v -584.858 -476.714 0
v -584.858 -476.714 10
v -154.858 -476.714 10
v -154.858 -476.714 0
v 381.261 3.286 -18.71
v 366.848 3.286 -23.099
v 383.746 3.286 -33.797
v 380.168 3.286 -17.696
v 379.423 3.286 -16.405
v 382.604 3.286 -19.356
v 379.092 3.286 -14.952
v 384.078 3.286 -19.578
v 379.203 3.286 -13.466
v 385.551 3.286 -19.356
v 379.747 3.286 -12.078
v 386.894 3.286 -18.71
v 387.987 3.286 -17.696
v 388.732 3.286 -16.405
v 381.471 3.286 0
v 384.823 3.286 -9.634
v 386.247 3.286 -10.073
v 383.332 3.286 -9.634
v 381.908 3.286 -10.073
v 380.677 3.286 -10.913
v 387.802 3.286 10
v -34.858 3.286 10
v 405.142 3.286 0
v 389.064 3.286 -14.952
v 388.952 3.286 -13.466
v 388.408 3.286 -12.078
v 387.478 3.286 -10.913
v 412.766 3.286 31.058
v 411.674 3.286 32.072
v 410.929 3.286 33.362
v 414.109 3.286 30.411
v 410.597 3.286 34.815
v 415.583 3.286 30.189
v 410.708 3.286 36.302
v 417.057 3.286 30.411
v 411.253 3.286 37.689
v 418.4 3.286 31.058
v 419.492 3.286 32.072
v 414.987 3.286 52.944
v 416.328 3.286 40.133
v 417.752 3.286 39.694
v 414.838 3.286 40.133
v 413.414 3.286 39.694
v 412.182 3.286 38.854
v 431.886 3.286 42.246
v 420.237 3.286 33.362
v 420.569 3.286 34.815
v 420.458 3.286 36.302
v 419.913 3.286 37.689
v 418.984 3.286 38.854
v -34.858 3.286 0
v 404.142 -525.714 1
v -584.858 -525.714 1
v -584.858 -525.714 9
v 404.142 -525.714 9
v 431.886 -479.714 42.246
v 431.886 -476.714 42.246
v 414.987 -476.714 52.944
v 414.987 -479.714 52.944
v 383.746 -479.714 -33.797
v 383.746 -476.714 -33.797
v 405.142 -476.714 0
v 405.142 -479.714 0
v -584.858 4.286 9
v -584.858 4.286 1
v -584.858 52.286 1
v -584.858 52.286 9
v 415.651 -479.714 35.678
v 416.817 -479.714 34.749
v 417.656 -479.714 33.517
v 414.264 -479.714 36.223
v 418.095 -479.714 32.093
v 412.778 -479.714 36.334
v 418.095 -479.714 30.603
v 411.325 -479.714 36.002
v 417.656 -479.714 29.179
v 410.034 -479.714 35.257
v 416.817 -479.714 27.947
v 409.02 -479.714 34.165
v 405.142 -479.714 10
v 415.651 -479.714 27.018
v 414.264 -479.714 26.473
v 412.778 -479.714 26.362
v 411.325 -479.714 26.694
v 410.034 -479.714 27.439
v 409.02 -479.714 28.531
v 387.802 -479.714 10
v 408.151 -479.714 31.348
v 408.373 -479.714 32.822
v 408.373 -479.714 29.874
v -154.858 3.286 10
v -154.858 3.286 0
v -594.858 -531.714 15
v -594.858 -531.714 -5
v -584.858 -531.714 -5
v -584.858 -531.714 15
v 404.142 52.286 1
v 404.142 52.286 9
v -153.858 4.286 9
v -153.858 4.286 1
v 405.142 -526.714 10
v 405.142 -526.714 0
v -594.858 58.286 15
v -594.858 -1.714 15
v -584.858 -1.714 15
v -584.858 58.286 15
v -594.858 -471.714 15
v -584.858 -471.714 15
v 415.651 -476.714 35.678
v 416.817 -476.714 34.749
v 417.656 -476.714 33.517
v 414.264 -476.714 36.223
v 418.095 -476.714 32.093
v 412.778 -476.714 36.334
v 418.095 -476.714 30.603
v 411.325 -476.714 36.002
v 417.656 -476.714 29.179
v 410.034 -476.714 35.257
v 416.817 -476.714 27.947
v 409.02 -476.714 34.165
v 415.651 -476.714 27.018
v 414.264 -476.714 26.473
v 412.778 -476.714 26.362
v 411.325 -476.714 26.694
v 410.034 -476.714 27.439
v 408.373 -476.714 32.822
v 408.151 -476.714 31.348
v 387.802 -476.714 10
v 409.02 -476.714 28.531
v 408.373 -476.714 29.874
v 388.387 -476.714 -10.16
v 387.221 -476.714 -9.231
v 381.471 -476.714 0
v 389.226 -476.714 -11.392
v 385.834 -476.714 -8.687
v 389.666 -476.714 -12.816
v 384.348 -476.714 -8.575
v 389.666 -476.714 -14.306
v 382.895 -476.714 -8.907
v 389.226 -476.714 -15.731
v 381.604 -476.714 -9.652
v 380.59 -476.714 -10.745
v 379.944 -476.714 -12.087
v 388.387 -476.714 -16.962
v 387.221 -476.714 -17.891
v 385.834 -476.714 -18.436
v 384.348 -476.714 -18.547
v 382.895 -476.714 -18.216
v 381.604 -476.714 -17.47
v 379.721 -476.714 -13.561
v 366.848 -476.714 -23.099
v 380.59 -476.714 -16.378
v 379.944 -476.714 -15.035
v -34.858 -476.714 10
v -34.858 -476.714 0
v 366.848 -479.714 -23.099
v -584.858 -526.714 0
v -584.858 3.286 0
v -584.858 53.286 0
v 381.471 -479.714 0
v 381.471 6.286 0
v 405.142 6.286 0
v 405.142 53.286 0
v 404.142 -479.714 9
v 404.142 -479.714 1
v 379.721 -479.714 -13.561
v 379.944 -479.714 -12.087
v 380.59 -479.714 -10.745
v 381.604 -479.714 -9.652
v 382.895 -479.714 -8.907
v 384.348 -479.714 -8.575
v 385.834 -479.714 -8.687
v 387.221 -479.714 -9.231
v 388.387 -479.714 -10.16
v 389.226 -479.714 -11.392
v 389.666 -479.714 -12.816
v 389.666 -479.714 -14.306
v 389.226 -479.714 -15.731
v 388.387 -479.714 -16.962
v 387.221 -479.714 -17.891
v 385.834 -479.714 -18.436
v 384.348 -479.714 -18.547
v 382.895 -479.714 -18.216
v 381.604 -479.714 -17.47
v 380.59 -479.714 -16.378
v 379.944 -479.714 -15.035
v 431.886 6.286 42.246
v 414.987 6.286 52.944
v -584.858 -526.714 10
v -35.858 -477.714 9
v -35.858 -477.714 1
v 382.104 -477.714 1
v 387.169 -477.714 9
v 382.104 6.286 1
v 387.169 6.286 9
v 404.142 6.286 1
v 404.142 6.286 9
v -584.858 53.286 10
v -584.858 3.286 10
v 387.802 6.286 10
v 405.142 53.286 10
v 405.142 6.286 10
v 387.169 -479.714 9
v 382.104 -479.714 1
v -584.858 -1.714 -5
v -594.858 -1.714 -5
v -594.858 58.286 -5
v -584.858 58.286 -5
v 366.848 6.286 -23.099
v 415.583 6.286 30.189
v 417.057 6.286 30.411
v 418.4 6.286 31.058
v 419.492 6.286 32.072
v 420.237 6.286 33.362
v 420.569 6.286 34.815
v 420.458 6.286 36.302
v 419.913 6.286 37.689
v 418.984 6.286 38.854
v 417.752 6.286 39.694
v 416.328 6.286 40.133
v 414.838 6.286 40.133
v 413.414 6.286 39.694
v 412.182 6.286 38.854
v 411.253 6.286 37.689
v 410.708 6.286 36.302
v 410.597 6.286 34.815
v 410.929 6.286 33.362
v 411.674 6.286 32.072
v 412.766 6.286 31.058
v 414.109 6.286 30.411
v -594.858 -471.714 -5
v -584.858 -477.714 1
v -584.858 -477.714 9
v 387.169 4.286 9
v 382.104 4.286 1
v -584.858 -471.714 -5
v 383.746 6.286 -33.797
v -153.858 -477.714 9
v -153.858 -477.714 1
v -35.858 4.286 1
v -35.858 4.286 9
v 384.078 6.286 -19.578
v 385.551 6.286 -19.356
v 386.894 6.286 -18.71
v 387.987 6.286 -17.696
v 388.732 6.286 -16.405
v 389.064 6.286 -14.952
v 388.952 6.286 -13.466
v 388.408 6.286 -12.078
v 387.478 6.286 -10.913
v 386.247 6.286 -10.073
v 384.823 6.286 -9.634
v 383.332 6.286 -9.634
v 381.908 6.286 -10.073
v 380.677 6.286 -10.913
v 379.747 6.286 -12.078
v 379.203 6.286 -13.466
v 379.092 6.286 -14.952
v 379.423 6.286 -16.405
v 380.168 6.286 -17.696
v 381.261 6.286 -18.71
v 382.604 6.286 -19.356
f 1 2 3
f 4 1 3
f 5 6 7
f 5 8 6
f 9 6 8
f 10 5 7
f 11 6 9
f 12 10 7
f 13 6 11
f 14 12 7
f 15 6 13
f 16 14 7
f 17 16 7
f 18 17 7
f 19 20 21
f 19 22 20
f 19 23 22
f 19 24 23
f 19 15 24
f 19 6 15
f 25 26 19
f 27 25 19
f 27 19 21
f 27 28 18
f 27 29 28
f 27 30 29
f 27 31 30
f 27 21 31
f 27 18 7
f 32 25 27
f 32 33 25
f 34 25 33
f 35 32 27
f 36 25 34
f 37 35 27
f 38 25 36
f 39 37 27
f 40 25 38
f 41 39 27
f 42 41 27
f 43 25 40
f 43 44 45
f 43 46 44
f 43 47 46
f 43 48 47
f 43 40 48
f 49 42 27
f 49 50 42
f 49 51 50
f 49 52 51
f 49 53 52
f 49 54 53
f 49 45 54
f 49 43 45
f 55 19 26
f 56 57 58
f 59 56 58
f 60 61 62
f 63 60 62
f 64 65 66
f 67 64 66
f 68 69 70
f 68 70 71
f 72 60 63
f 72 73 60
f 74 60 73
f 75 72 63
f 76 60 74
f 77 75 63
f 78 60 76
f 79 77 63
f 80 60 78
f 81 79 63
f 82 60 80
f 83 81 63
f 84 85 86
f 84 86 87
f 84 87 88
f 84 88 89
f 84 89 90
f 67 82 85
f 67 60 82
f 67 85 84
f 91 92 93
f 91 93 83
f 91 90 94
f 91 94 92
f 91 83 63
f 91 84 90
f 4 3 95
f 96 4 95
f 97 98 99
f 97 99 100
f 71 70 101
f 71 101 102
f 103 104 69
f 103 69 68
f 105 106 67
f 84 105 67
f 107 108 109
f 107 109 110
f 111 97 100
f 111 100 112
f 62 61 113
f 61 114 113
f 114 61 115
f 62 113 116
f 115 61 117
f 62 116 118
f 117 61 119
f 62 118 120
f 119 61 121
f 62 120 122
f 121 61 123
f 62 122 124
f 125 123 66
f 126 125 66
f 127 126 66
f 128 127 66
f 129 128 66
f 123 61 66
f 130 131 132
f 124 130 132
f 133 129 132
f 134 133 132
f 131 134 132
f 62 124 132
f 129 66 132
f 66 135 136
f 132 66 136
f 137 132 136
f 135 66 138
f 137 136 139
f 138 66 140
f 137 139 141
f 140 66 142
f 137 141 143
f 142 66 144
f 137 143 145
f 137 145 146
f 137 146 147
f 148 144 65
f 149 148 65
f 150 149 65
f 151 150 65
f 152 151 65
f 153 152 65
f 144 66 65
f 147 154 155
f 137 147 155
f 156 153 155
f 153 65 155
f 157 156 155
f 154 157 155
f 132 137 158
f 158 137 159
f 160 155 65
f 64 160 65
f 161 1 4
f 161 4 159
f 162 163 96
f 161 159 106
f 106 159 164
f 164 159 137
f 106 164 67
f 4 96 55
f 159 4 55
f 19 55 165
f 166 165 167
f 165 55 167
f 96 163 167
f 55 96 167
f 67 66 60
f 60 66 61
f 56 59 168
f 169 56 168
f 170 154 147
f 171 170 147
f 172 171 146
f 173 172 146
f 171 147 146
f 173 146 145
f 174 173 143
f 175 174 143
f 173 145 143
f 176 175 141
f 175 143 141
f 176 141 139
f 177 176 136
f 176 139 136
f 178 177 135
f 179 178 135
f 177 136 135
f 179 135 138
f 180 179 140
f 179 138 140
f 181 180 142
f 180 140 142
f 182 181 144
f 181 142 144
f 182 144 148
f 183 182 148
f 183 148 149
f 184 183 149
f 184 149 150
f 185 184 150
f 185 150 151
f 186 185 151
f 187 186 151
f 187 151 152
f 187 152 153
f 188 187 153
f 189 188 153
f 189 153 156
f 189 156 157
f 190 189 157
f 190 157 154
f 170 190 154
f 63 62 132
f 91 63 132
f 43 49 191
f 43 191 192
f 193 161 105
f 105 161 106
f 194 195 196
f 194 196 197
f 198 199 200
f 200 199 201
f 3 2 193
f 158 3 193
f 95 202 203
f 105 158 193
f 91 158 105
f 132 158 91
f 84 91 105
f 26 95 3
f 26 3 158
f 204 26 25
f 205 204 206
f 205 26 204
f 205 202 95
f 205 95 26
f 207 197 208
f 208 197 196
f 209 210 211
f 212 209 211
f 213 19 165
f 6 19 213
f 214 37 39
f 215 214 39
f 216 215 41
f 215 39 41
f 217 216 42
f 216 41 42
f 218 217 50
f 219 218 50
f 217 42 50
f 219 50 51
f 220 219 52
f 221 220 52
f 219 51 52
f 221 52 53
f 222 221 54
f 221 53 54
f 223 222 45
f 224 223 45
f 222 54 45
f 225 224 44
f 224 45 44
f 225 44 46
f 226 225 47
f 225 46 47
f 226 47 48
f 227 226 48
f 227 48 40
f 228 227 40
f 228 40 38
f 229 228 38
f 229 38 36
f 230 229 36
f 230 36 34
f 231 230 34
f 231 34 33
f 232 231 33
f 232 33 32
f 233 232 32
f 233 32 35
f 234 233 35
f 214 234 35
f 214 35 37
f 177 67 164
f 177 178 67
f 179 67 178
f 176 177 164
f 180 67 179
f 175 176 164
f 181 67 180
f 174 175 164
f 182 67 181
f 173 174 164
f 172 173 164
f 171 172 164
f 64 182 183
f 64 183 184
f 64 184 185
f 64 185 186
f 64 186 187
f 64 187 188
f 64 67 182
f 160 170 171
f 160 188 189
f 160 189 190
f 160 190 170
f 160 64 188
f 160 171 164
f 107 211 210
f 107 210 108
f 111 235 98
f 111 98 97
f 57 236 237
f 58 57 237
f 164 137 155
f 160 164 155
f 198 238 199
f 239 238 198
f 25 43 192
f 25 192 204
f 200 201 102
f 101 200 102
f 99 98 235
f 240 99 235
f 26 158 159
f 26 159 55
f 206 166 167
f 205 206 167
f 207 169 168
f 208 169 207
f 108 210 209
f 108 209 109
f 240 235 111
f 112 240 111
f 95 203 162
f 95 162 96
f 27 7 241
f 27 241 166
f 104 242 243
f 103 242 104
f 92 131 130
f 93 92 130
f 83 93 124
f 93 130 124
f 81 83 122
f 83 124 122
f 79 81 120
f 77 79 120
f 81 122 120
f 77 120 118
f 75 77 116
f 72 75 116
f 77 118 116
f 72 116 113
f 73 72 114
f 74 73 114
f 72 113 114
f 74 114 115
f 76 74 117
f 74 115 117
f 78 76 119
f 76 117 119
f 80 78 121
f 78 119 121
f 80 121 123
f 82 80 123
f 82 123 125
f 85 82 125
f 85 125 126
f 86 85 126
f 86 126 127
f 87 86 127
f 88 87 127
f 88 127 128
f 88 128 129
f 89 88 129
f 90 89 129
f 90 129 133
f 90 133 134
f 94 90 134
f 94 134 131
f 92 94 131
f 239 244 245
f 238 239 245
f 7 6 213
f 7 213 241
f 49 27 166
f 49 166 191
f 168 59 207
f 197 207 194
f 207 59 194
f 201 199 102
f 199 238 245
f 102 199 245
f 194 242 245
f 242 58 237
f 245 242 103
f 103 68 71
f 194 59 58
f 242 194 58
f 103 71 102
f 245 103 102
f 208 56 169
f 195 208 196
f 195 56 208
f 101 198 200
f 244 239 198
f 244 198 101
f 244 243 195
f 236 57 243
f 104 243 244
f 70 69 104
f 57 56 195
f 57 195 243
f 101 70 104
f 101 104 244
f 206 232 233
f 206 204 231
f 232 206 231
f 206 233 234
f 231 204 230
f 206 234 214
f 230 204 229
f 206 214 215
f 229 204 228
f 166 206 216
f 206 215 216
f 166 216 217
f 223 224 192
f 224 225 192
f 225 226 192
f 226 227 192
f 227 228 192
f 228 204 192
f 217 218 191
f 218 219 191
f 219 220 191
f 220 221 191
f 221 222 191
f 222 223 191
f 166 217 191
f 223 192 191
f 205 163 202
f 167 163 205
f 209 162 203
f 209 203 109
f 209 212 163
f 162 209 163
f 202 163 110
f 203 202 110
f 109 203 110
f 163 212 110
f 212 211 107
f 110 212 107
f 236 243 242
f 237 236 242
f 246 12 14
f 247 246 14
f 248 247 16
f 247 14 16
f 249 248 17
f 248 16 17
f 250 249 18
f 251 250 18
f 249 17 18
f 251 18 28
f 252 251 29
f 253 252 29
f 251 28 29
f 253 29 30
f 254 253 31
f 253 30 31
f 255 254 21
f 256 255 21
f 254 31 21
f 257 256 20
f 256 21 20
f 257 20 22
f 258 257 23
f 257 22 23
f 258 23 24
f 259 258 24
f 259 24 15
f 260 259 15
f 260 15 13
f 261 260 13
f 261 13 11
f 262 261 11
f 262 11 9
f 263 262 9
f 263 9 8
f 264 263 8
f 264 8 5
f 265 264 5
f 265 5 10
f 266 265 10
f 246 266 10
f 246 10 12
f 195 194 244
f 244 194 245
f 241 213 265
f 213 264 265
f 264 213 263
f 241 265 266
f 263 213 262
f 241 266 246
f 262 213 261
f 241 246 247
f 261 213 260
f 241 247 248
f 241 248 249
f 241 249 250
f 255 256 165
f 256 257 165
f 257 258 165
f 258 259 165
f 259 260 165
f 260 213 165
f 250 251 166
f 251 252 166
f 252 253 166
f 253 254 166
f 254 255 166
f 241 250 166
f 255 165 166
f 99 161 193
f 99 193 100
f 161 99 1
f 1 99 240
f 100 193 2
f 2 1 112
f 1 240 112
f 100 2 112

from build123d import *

# Parameters (mm, degrees)
SKETCH1_W           = 1000
SKETCH1_H           = 580
BOSS_EXTRUDE1_DEPTH = 10
SKETCH2_W           = 440
SKETCH2_H           = 480
CUT_EXTRUDE3_DEPTH  = 795.596872652
SHELL2_START        = -593.858216583
SHELL2_OUTLINE_W    = 48
SHELL2_OUTLINE_H    = 8
SHELL2_DEPTH        = 998
SHELL2_START_2      = -153.858216583
SHELL2_2_OUTLINE_W  = 482
SHELL2_2_OUTLINE_H  = 8
SHELL2_2_DEPTH      = 118
BOSS_EXTRUDE2_DEPTH = 3
BOSS_EXTRUDE4_DEPTH = 3
SKETCH11_R          = 5
CUT_EXTRUDE6_DEPTH  = 799.473143596
SKETCH13_R          = 5
CUT_EXTRUDE7_DEPTH  = 799.473143596
SKETCH14_W          = 20
SKETCH14_H          = 60
BOSS_EXTRUDE5_DEPTH = 10
SKETCH15_W          = 20
SKETCH15_H          = 60
BOSS_EXTRUDE6_DEPTH = 10


# Read off the part's stored shape, not the designer's step: Shell2
with BuildPart() as part:
    # Sketch1 → Boss-Extrude1 (new body)
    with BuildSketch(Plane.XY):
        with Locations((-94.858216583, -236.714241493)):
            Rectangle(SKETCH1_W, SKETCH1_H)
    extrude(amount=BOSS_EXTRUDE1_DEPTH)

    # Sketch2 → Cut-Extrude3 (cut, through all)
    with BuildSketch(Plane.XY.offset(10)):
        with Locations((185.141783417, -236.714241493)):
            Rectangle(SKETCH2_W, SKETCH2_H)
        with Locations((-374.858216583, -236.714241493)):
            Rectangle(SKETCH2_W, SKETCH2_H)
    extrude(amount=-CUT_EXTRUDE3_DEPTH, mode=Mode.SUBTRACT)

    # Shell2 outline → Shell2 (cut)
    with BuildSketch(Plane.YZ.offset(SHELL2_START)):
        with Locations((-501.714241493, 5)):
            Rectangle(SHELL2_OUTLINE_W, SHELL2_OUTLINE_H)
        with Locations((28.285758507, 5)):
            Rectangle(SHELL2_OUTLINE_W, SHELL2_OUTLINE_H)
    extrude(amount=SHELL2_DEPTH, mode=Mode.SUBTRACT)

    # Shell2 2 outline → Shell2 2 (cut)
    with BuildSketch(Plane.YZ.offset(SHELL2_START_2)):
        with Locations((-236.714241493, 5)):
            Rectangle(SHELL2_2_OUTLINE_W, SHELL2_2_OUTLINE_H)
    extrude(amount=SHELL2_2_DEPTH, mode=Mode.SUBTRACT)

    # Sketch5 → Boss-Extrude2 (add)
    with BuildSketch(Plane(origin=(0, -476.714241493, 0), x_dir=(1, 0, 0), z_dir=(0, 1, 0))):
        Polygon((405.141783417, 0), (431.885950294, -42.246296146), (414.987431836, -52.943962897), (366.847931456, 23.099370165), (383.746449915, 33.797036917), align=None)
    extrude(amount=-BOSS_EXTRUDE2_DEPTH)

    # Sketch10 → Boss-Extrude4 (add)
    with BuildSketch(Plane.XZ.offset(-3.285758507)):
        Polygon((405.141783417, 0), (431.885972414, 42.246282142), (414.987459557, 52.943957741), (366.847919362, -23.099350115), (383.746432219, -33.797025714), align=None)
    extrude(amount=-BOSS_EXTRUDE4_DEPTH)

    # Sketch11 → Cut-Extrude6 (cut, through all)
    with BuildSketch(Plane.XZ.offset(-3.285758507)):
        with Locations(Location((415.58302294, 35.189085408, 0), (0, 0, 270))):
            Circle(SKETCH11_R)
        with Locations(Location((384.0775579, -14.578315099, 0), (0, 0, 270))):
            Circle(SKETCH11_R)
    extrude(amount=-CUT_EXTRUDE6_DEPTH, mode=Mode.SUBTRACT)

    # Sketch13 → Cut-Extrude7 (cut, through all)
    with BuildSketch(Plane(origin=(0, -476.714241493, 0), x_dir=(1, 0, 0), z_dir=(0, 1, 0))):
        with Locations(Location((413.151340982, -31.347925129, 0), (0, 0, 180))):
            Circle(SKETCH13_R)
        with Locations(Location((384.72142187, 13.561261525, 0), (0, 0, 180))):
            Circle(SKETCH13_R)
    extrude(amount=-CUT_EXTRUDE7_DEPTH, mode=Mode.SUBTRACT)

    # Sketch14 → Boss-Extrude5 (add)
    with BuildSketch(Plane.ZY.offset(594.858216583)):
        with Locations((5, 28.285758507)):
            Rectangle(SKETCH14_W, SKETCH14_H)
    extrude(amount=-BOSS_EXTRUDE5_DEPTH)

    # Sketch15 → Boss-Extrude6 (add)
    with BuildSketch(Plane.ZY.offset(594.858216583)):
        with Locations((5, -501.714241493)):
            Rectangle(SKETCH15_W, SKETCH15_H)
    extrude(amount=-BOSS_EXTRUDE6_DEPTH)


solid = part.part
